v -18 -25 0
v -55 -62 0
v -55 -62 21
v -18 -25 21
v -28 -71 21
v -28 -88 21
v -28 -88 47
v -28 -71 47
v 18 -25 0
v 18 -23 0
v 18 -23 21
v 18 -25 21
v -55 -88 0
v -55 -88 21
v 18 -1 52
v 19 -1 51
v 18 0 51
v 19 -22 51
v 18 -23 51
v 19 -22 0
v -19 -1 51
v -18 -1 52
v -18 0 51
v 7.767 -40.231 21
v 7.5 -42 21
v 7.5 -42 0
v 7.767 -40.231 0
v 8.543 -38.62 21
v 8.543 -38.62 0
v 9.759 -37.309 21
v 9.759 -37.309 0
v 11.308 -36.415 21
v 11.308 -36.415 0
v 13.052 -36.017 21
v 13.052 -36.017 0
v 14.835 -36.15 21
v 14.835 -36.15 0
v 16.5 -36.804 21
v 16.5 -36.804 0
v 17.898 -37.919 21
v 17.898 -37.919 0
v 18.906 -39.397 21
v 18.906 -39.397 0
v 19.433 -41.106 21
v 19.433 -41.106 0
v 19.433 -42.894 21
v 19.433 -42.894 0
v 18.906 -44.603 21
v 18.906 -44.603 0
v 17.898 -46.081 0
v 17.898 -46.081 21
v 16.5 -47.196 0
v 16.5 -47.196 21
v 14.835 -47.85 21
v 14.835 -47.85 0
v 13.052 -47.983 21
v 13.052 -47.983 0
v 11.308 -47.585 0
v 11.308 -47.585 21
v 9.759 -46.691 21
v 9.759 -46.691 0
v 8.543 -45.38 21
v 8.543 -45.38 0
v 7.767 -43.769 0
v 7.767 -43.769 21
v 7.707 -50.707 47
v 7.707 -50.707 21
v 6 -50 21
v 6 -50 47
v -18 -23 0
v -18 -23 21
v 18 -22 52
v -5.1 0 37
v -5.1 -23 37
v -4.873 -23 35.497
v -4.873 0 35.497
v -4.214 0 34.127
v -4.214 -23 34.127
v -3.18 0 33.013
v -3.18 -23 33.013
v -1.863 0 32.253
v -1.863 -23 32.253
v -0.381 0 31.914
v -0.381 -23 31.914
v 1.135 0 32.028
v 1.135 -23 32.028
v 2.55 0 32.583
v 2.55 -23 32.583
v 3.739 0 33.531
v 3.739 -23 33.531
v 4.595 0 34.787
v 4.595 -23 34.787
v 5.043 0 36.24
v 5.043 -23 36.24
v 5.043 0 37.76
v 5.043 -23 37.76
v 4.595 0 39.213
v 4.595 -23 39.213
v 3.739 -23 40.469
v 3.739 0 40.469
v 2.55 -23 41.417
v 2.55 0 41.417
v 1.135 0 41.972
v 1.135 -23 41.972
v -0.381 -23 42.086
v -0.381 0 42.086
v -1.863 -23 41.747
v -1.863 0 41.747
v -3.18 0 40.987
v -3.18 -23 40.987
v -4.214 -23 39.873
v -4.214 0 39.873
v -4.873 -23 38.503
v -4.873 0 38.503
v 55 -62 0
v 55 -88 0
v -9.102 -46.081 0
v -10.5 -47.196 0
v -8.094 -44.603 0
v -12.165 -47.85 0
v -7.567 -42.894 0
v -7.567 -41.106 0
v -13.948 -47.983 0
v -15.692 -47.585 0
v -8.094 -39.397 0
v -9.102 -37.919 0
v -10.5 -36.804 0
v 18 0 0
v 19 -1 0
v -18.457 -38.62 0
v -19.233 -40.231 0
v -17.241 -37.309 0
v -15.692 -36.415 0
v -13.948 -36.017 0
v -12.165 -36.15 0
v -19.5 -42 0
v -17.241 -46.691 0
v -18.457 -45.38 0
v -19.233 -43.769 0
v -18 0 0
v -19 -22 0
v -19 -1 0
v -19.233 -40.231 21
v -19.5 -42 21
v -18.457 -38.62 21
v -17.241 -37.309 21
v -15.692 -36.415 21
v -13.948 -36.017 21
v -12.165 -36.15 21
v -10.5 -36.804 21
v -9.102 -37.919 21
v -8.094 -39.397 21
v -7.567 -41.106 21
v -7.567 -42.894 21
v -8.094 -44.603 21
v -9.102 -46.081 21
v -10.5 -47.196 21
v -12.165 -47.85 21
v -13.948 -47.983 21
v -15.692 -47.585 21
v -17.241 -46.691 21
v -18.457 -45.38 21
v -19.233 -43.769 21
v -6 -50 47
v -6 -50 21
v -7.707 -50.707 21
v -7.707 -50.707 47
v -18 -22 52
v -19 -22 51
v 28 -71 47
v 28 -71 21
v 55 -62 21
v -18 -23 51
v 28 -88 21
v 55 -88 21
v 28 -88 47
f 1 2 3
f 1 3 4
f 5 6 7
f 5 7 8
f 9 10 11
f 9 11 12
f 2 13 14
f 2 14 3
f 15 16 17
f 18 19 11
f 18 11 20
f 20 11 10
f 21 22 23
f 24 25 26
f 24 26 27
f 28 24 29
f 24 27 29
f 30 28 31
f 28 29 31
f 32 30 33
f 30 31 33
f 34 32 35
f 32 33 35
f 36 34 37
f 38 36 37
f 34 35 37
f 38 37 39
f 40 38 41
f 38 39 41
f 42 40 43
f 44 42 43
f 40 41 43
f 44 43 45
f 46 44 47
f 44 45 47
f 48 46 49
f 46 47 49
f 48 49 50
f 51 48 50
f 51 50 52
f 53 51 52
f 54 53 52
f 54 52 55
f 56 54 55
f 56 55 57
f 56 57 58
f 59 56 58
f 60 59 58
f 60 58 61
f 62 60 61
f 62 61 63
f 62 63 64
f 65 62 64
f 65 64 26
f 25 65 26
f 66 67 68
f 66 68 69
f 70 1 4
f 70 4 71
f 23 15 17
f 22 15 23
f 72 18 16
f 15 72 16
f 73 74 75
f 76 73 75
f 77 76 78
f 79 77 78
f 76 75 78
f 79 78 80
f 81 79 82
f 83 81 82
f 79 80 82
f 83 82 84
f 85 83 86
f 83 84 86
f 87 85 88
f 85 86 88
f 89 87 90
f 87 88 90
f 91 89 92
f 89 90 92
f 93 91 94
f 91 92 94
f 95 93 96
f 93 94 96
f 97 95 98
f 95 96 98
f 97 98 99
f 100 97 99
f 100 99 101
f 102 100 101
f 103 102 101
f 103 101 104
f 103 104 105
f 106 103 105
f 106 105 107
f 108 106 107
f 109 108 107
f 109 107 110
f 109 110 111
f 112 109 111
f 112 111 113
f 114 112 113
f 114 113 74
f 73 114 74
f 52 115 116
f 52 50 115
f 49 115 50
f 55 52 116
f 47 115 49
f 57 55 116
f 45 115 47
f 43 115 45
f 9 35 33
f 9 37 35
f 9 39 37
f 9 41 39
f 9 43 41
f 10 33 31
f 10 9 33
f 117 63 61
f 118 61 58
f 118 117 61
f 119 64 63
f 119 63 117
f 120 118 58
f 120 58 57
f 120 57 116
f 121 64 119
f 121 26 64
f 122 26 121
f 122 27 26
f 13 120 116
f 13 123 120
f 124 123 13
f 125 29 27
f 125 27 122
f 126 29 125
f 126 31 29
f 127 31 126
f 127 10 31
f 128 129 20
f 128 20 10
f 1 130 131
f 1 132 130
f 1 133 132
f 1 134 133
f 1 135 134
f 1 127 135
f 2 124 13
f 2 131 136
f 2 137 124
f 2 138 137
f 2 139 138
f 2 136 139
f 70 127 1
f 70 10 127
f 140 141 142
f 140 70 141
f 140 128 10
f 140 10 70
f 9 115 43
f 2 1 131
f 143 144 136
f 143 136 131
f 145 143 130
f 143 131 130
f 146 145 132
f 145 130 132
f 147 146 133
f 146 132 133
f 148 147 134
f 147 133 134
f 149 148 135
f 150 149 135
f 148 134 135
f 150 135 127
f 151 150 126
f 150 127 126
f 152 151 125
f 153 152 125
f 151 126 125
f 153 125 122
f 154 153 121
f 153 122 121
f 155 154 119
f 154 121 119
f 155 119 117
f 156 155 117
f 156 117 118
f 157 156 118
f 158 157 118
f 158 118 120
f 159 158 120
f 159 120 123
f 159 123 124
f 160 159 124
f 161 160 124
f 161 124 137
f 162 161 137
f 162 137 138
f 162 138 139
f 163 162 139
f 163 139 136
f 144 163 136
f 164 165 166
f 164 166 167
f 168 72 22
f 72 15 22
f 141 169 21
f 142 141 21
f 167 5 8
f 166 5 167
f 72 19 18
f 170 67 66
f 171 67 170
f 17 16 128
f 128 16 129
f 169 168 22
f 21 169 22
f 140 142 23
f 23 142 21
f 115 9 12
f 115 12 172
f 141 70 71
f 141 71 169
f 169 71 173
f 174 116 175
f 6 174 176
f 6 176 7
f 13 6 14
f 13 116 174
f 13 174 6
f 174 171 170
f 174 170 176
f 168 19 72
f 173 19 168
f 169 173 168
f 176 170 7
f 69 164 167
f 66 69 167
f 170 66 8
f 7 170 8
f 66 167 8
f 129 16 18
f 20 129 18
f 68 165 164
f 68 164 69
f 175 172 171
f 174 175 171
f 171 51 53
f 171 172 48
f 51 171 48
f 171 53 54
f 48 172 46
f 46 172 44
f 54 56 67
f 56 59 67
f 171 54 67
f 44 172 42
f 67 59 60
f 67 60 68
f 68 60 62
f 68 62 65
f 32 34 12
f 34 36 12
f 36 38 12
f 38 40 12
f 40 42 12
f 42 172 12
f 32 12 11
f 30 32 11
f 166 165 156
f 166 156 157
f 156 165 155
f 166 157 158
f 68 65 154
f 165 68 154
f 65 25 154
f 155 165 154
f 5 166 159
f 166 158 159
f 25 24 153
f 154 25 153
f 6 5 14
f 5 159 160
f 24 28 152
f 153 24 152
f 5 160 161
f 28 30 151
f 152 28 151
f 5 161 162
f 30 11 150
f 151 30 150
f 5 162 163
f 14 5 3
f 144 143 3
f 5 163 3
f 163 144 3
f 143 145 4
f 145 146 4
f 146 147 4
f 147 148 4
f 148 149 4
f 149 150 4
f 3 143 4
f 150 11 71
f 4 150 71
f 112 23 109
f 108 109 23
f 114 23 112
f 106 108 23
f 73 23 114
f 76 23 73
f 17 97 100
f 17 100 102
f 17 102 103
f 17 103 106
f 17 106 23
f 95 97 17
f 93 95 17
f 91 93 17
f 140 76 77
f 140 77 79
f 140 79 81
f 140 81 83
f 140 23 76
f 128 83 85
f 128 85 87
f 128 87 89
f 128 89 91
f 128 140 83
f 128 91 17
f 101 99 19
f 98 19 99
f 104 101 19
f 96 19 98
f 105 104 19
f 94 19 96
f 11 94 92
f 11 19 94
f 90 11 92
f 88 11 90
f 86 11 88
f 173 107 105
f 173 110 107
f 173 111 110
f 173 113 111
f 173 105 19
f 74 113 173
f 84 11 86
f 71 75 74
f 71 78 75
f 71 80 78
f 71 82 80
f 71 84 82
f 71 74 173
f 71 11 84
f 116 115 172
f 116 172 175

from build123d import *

# Parameters (mm, degrees)
BOSS_EXTRUDE1_DEPTH        = 21
SKETCH2_W                  = 38
SKETCH2_H                  = 23
BOSS_EXTRUDE2_DEPTH        = 52
BOSS_EXTRUDE3_DEPTH        = 26
CHAMFER1_SIZE              = 1
M12_TAPPED_HOLE1_D         = 10.2
M12_TAPPED_HOLE1_DEPTH     = 23
F_12_0_12_DIAMETER_HOLE1_D = 12
CHAMFER2_SIZE              = 1


with BuildPart() as part:
    # Sketch1 → Boss-Extrude1 (new body)
    with BuildSketch(Plane.XY):
        Polygon((-19, 0), (19, 0), (19, -23), (18, -23), (18, -25), (55, -62), (55, -88), (-55, -88), (-55, -62), (-18, -25), (-18, -23), (-19, -23), align=None)
    extrude(amount=BOSS_EXTRUDE1_DEPTH)

    # Sketch2 → Boss-Extrude2 (add)
    with BuildSketch(Plane(origin=(0, 0, 0), x_dir=(-1, 0, 0), z_dir=(0, 0, -1))):
        with Locations((0, -11.5)):
            Rectangle(SKETCH2_W, SKETCH2_H)
    extrude(amount=-BOSS_EXTRUDE2_DEPTH)

    # Sketch3 → Boss-Extrude3 (add)
    with BuildSketch(Plane.XY.offset(21)):
        Polygon((-7, -50), (7, -50), (28, -71), (28, -88), (-28, -88), (-28, -71), align=None)
    extrude(amount=BOSS_EXTRUDE3_DEPTH)

    # Chamfer1
    chamfer1_edges = [part.edges().sort_by_distance(p)[0] for p in [
        (0, -23, 52),
        (-19, -23, 26),
        (-19, -11.5, 52),
        (19, -23, 26),
        (19, -11.5, 52),
        (19, 0, 26),
        (0, 0, 52),
        (-19, 0, 26),
    ]]
    chamfer(chamfer1_edges, length=CHAMFER1_SIZE)

    # M12 Tapped Hole1
    with Locations(Plane(origin=(0, 0, 0), x_dir=(1, 0, 0), z_dir=(0, 1, 0))):
        with Locations((0, -37)):
            Hole(M12_TAPPED_HOLE1_D / 2, depth=M12_TAPPED_HOLE1_DEPTH)

    # Ø12.0 (12) Diameter Hole1 (through all)
    with Locations(Plane.XY.offset(21)):
        with Locations((-13.5, -42), (13.5, -42)):
            Hole(F_12_0_12_DIAMETER_HOLE1_D / 2)

    # Chamfer2
    chamfer2_edges = [part.edges().sort_by_distance(p)[0] for p in [
        (7, -50, 34),
        (-7, -50, 34),
    ]]
    chamfer(chamfer2_edges, length=CHAMFER2_SIZE)


solid = part.part
